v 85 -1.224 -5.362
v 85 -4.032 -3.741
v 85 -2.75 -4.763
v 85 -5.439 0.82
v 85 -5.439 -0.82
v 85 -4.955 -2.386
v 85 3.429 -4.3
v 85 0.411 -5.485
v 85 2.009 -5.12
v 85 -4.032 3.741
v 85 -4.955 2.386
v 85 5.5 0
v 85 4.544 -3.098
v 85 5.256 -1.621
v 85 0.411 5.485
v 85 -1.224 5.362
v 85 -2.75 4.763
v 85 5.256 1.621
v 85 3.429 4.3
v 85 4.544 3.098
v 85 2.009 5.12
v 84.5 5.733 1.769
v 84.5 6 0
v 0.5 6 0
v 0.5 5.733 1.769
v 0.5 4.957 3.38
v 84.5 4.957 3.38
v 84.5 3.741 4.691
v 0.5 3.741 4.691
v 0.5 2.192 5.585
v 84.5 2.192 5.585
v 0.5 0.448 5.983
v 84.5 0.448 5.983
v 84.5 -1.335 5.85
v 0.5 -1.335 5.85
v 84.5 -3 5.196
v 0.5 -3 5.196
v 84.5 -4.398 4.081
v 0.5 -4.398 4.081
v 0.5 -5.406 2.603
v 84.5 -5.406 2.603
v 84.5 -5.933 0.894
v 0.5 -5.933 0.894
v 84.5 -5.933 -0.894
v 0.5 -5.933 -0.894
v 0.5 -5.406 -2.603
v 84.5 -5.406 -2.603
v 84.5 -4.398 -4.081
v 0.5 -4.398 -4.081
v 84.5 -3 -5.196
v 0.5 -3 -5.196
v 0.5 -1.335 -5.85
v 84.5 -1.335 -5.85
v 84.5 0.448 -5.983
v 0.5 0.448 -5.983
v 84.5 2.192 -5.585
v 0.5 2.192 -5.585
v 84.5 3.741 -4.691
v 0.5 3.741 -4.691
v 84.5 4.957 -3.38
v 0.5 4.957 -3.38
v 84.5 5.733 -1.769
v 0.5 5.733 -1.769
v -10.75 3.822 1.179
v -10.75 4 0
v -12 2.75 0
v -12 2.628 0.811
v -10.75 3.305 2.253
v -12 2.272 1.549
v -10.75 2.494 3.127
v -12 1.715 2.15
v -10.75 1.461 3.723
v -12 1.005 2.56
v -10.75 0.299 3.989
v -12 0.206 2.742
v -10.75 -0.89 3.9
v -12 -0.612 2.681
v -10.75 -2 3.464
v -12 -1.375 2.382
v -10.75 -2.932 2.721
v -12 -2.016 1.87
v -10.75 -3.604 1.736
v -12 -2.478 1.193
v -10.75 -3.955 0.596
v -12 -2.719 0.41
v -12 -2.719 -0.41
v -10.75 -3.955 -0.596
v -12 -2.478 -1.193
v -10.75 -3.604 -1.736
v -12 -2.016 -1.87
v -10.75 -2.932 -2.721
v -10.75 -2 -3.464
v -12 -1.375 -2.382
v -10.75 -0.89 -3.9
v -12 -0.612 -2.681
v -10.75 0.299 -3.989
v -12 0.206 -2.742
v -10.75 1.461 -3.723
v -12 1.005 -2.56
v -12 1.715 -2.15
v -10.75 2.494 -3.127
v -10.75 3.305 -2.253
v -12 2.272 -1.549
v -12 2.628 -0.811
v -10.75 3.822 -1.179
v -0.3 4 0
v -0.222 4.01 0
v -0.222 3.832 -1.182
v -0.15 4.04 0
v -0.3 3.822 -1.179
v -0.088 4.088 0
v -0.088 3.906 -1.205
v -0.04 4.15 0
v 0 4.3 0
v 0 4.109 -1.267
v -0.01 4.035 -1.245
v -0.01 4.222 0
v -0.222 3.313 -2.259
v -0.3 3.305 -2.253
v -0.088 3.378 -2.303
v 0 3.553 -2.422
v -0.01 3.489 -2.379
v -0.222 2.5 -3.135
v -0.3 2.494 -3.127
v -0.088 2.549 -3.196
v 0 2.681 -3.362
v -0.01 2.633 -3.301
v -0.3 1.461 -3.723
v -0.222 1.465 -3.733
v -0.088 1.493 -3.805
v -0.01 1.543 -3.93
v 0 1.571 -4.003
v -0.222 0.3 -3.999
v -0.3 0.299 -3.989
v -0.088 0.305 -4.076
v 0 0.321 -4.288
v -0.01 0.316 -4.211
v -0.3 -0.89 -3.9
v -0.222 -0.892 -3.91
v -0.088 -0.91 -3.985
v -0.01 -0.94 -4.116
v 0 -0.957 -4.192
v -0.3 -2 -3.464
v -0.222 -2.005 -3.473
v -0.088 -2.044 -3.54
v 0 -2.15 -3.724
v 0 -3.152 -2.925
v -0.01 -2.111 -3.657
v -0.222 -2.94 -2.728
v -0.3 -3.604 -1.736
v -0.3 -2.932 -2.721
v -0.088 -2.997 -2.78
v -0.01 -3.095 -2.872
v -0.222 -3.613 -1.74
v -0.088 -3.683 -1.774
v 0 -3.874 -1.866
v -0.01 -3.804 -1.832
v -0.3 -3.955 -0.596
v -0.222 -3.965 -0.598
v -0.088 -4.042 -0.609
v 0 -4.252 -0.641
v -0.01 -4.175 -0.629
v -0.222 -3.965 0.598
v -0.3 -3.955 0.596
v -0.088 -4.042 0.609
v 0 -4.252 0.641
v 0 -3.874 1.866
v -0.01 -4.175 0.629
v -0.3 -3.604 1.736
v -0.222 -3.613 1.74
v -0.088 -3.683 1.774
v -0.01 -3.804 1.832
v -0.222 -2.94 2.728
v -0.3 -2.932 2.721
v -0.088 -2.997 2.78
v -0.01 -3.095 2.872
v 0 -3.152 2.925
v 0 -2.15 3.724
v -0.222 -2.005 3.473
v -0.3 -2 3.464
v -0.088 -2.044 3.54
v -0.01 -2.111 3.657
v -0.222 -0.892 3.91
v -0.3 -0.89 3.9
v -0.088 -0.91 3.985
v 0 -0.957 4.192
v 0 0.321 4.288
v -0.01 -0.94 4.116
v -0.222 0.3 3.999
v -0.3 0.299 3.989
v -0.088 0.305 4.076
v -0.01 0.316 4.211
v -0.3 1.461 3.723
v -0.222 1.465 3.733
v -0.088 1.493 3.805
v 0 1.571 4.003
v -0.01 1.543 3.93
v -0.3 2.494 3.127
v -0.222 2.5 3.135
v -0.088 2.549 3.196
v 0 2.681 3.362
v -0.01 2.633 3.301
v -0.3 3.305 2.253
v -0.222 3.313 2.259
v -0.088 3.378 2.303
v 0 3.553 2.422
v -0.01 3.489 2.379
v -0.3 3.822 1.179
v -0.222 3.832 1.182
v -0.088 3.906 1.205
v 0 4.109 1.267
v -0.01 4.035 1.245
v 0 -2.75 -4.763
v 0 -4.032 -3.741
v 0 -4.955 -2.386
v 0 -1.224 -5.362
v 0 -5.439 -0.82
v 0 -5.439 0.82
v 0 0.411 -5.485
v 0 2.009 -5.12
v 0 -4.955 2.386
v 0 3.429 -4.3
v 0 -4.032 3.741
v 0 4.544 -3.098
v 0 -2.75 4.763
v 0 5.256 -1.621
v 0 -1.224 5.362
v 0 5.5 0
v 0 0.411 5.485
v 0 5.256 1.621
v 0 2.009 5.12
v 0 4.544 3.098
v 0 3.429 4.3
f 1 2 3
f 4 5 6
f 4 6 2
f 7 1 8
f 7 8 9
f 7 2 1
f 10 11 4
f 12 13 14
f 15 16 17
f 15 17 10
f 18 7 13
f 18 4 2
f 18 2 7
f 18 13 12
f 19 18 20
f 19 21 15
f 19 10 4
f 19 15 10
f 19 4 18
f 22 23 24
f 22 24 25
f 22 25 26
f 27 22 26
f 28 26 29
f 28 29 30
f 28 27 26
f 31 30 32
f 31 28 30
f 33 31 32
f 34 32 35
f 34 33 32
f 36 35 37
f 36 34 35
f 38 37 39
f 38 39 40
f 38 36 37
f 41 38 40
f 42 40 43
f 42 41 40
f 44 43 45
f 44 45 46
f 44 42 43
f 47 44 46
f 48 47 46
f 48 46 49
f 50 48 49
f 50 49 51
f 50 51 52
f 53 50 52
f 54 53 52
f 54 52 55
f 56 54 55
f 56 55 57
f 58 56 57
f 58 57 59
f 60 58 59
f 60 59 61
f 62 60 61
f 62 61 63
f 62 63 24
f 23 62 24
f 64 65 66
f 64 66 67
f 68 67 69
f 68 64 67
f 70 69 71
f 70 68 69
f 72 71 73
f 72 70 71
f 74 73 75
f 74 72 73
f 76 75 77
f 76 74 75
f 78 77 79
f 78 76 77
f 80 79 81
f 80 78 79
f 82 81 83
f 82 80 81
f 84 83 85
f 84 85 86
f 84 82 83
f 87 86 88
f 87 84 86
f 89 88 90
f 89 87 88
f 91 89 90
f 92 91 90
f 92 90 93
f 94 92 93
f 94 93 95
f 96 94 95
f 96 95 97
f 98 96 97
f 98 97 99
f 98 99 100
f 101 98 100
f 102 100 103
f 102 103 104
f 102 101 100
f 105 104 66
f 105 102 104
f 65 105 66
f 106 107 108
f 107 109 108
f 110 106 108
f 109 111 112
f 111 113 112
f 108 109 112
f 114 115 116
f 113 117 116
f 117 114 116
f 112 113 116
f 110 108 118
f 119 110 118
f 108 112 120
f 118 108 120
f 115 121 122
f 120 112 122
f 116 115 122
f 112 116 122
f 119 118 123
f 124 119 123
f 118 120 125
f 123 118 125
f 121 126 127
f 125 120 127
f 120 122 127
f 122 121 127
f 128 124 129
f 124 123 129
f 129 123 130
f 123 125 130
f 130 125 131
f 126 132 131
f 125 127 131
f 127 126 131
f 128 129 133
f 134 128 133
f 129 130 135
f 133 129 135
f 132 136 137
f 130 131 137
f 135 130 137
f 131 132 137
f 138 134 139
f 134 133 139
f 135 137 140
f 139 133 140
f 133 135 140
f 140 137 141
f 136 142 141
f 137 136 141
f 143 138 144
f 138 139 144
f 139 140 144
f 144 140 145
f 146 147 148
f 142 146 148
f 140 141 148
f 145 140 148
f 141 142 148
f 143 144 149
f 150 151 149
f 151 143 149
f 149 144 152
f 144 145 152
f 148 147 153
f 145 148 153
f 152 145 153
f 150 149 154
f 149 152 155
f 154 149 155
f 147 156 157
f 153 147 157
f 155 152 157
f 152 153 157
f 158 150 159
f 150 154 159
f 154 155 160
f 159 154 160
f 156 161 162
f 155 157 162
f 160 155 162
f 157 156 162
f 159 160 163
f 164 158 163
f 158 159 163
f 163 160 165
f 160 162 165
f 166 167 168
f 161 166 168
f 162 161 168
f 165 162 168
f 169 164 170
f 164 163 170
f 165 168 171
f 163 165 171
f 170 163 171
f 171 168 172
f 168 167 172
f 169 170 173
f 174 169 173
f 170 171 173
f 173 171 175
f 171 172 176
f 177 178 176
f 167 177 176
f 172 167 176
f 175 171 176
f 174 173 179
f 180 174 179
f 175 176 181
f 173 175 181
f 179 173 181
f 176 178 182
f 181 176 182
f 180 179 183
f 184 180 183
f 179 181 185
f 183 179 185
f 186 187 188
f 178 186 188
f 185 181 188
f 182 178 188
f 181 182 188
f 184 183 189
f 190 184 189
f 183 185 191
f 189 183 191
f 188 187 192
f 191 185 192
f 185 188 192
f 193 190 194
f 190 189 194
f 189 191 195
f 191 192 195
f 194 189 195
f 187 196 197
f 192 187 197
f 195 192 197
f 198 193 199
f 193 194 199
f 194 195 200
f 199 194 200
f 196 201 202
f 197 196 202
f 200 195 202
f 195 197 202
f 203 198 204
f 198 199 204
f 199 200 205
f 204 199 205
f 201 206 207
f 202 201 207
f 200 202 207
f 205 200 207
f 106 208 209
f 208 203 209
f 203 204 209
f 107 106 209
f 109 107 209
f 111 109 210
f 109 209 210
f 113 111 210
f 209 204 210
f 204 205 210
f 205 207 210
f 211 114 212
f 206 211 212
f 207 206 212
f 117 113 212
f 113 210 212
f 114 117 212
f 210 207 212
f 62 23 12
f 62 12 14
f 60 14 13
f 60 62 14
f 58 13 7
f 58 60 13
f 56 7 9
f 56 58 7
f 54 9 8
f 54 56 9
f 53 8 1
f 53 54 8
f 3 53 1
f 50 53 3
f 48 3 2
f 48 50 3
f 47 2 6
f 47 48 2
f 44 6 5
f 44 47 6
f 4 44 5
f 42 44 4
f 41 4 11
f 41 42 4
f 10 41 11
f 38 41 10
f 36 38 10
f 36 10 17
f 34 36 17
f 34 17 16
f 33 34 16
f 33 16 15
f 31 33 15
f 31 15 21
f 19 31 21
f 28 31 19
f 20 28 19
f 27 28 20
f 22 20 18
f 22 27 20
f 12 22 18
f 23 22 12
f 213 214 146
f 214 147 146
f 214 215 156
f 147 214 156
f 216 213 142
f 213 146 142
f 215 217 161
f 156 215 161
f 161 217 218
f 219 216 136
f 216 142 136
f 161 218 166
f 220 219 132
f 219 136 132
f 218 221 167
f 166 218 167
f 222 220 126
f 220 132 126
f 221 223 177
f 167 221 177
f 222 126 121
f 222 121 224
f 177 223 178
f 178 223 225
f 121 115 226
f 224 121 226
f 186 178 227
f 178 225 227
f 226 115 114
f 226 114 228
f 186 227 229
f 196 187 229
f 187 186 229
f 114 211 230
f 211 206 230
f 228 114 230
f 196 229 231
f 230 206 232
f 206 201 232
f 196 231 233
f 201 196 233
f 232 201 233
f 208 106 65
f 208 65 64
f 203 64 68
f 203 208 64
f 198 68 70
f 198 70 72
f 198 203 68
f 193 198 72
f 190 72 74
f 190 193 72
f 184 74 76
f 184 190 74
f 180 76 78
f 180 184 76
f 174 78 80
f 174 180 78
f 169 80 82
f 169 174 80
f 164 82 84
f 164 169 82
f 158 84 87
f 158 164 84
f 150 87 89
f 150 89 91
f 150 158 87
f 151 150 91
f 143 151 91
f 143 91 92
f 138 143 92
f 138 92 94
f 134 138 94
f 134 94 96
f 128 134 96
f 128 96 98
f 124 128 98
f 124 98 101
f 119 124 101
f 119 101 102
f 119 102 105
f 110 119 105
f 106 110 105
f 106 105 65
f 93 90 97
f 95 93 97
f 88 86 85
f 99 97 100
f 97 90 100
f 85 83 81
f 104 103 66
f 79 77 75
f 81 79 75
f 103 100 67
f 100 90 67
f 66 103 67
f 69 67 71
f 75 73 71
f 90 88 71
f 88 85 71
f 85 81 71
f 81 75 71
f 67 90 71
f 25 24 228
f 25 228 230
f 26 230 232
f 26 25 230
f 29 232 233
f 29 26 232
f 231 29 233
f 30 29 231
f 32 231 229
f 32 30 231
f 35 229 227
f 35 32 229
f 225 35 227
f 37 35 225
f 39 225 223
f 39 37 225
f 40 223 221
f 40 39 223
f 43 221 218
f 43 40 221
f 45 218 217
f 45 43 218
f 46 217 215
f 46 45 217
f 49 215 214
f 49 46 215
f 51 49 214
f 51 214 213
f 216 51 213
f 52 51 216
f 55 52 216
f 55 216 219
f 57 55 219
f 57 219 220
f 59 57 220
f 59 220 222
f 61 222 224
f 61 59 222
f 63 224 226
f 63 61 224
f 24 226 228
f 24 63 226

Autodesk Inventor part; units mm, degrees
ref_plane "YZ Plane" through (0, 0, 0) normal (1, 0, 0) x (0, 1, 0)
ref_plane "XZ Plane" through (0, 0, 0) normal (0, 1, 0) x (-1, 0, 0)
ref_plane "XY Plane" through (0, 0, 0) normal (0, 0, 1) x (1, 0, 0)
sketch "Sketch_1" plane through (0, 0, 0) normal (0, 0, 1) x (1, 0, 0)
  line L0 (85, 0) -> (-12, 0)
  line L1 (-12, 0) -> (-12, 2.75)
  line L2 (-12, 2.75) -> (-10.75, 4)
  line L3 (-10.75, 4) -> (-0.3, 4)
  arc A0 (-0.3, 4) -> (0, 4.3) centre (-0.3, 4.3) ccw
  line L4 (0, 4.3) -> (0, 5.5)
  line L5 (0, 5.5) -> (0.5, 6)
  line L6 (0.5, 6) -> (84.5, 6)
  line L7 (84.5, 6) -> (85, 5.5)
  line L8 (85, 5.5) -> (85, 0)
  line L9 (85, 0) -> (-12, 0)
revolve "Revolution1" add sketch "Sketch_1" angle 360 about axis through (85, 0, 0) along (1, 0, 0)
properties part number "SSFCU12-85-F12-P8"
